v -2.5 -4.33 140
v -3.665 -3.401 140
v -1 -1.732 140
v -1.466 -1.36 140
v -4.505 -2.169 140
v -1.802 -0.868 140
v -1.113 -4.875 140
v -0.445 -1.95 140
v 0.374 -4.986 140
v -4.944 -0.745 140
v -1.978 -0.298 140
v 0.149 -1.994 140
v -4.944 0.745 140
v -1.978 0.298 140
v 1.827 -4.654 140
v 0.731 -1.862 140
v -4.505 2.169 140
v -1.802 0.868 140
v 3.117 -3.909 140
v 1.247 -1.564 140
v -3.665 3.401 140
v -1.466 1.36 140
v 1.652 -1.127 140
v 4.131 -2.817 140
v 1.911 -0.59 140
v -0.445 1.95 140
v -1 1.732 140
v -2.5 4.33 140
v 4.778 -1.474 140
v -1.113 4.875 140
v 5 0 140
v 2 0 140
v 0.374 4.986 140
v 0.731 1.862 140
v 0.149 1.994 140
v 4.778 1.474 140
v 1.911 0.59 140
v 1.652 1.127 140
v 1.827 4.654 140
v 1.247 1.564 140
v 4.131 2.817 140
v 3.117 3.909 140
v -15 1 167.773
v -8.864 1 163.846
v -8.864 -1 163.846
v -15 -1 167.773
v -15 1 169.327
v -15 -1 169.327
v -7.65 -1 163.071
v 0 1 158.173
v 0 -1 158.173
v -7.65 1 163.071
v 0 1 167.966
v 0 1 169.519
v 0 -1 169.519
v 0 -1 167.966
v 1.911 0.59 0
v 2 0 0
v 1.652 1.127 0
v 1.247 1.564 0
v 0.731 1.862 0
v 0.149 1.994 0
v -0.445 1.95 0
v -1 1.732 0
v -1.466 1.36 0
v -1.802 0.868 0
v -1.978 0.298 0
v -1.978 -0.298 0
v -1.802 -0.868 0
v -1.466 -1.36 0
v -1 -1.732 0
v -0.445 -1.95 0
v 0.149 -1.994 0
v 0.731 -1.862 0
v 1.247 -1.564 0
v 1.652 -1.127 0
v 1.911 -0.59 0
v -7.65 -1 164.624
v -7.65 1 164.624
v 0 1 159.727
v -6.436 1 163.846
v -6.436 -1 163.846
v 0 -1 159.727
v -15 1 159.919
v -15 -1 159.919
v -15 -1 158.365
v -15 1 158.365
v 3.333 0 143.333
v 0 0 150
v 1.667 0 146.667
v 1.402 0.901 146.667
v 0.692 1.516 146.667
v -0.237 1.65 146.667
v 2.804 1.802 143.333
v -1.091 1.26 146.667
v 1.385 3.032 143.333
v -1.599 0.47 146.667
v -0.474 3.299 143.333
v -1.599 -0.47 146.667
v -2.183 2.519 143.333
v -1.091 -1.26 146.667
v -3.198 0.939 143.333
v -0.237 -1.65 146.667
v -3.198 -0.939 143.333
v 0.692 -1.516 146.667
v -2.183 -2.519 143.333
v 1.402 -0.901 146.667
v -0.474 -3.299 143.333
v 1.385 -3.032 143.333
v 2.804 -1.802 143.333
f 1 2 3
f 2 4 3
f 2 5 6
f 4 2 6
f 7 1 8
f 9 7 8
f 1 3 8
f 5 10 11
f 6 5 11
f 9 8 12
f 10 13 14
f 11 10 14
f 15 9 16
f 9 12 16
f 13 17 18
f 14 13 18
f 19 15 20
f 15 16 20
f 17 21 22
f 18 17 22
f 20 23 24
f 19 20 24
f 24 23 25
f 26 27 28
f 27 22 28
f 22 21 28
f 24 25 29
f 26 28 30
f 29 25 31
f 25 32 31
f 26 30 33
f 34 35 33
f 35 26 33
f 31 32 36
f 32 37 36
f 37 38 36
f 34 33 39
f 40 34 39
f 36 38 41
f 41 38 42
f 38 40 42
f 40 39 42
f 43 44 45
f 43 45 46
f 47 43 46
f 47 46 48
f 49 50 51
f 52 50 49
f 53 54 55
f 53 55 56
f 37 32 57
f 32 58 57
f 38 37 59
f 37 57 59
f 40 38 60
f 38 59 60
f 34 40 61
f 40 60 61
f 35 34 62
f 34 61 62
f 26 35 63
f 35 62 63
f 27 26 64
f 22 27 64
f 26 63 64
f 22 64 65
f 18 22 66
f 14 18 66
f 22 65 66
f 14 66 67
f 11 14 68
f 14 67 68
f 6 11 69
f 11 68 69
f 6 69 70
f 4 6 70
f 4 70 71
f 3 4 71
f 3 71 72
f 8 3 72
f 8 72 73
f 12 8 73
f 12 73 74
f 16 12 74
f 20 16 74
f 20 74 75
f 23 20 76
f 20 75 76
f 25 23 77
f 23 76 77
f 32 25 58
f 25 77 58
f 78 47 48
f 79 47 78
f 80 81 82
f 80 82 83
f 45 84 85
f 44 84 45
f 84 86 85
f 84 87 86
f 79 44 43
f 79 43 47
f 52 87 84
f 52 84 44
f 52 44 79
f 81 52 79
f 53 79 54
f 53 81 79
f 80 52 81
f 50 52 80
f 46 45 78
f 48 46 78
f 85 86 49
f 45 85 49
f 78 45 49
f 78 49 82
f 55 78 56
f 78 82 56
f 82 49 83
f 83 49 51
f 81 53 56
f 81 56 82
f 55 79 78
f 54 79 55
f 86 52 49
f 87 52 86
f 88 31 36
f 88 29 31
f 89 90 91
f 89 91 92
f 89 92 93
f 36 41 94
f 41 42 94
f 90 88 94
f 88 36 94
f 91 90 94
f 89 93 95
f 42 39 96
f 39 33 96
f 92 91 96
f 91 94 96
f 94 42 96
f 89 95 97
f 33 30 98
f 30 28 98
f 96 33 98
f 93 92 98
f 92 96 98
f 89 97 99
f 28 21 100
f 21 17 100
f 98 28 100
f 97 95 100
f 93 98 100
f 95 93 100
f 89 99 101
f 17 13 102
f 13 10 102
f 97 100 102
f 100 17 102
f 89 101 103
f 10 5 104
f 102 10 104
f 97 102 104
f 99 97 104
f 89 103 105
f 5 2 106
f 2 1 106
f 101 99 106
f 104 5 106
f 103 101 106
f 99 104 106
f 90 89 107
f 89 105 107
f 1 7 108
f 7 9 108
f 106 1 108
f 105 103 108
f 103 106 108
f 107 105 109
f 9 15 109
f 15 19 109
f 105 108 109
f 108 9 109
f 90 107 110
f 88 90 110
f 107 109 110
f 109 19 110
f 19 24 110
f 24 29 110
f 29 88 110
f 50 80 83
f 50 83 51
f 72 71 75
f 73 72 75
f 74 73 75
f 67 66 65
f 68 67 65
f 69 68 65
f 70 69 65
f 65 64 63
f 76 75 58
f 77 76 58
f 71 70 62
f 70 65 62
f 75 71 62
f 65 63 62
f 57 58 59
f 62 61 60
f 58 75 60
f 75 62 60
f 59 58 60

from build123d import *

# Parameters (mm, degrees)
BOSS_EXTRUDE1_DEPTH      = 1
BOSS_EXTRUDE1_DEPTH_BACK = 1


with BuildPart() as part:
    # Sketch2 → Revolve1 (revolve)
    with BuildSketch(Plane(origin=(0, 0, 0), x_dir=(1, 0, 0), z_dir=(0, 1, 0))):
        Polygon((0, -150), (5, -140), (2, -140), (2, 0), (0, 0), align=None)
    revolve(axis=Axis((0, 0, -41.949952025), (0, 0, 1)))


with BuildPart() as body_2:
    # Sketch3 → Boss-Extrude1 (new, two sides: drawn at the far end of the back side and taken through both)
    with BuildSketch(Plane(origin=(0, 0, 0), x_dir=(1, 0, 0), z_dir=(0, 1, 0)).offset(-BOSS_EXTRUDE1_DEPTH_BACK)):
        Polygon((-15, -158.365384615), (-15, -159.918870192), (-8.864182692, -163.846153846), (-15, -167.7734375), (-15, -169.326923077), (-7.650240385, -164.624399038), (0, -169.519230769), (0, -167.965745192), (-6.436298077, -163.846153846), (0, -159.7265625), (0, -158.173076923), (-7.650240385, -163.070913462), align=None)
    extrude(amount=BOSS_EXTRUDE1_DEPTH + BOSS_EXTRUDE1_DEPTH_BACK)


solid = Compound([part.part, body_2.part])
